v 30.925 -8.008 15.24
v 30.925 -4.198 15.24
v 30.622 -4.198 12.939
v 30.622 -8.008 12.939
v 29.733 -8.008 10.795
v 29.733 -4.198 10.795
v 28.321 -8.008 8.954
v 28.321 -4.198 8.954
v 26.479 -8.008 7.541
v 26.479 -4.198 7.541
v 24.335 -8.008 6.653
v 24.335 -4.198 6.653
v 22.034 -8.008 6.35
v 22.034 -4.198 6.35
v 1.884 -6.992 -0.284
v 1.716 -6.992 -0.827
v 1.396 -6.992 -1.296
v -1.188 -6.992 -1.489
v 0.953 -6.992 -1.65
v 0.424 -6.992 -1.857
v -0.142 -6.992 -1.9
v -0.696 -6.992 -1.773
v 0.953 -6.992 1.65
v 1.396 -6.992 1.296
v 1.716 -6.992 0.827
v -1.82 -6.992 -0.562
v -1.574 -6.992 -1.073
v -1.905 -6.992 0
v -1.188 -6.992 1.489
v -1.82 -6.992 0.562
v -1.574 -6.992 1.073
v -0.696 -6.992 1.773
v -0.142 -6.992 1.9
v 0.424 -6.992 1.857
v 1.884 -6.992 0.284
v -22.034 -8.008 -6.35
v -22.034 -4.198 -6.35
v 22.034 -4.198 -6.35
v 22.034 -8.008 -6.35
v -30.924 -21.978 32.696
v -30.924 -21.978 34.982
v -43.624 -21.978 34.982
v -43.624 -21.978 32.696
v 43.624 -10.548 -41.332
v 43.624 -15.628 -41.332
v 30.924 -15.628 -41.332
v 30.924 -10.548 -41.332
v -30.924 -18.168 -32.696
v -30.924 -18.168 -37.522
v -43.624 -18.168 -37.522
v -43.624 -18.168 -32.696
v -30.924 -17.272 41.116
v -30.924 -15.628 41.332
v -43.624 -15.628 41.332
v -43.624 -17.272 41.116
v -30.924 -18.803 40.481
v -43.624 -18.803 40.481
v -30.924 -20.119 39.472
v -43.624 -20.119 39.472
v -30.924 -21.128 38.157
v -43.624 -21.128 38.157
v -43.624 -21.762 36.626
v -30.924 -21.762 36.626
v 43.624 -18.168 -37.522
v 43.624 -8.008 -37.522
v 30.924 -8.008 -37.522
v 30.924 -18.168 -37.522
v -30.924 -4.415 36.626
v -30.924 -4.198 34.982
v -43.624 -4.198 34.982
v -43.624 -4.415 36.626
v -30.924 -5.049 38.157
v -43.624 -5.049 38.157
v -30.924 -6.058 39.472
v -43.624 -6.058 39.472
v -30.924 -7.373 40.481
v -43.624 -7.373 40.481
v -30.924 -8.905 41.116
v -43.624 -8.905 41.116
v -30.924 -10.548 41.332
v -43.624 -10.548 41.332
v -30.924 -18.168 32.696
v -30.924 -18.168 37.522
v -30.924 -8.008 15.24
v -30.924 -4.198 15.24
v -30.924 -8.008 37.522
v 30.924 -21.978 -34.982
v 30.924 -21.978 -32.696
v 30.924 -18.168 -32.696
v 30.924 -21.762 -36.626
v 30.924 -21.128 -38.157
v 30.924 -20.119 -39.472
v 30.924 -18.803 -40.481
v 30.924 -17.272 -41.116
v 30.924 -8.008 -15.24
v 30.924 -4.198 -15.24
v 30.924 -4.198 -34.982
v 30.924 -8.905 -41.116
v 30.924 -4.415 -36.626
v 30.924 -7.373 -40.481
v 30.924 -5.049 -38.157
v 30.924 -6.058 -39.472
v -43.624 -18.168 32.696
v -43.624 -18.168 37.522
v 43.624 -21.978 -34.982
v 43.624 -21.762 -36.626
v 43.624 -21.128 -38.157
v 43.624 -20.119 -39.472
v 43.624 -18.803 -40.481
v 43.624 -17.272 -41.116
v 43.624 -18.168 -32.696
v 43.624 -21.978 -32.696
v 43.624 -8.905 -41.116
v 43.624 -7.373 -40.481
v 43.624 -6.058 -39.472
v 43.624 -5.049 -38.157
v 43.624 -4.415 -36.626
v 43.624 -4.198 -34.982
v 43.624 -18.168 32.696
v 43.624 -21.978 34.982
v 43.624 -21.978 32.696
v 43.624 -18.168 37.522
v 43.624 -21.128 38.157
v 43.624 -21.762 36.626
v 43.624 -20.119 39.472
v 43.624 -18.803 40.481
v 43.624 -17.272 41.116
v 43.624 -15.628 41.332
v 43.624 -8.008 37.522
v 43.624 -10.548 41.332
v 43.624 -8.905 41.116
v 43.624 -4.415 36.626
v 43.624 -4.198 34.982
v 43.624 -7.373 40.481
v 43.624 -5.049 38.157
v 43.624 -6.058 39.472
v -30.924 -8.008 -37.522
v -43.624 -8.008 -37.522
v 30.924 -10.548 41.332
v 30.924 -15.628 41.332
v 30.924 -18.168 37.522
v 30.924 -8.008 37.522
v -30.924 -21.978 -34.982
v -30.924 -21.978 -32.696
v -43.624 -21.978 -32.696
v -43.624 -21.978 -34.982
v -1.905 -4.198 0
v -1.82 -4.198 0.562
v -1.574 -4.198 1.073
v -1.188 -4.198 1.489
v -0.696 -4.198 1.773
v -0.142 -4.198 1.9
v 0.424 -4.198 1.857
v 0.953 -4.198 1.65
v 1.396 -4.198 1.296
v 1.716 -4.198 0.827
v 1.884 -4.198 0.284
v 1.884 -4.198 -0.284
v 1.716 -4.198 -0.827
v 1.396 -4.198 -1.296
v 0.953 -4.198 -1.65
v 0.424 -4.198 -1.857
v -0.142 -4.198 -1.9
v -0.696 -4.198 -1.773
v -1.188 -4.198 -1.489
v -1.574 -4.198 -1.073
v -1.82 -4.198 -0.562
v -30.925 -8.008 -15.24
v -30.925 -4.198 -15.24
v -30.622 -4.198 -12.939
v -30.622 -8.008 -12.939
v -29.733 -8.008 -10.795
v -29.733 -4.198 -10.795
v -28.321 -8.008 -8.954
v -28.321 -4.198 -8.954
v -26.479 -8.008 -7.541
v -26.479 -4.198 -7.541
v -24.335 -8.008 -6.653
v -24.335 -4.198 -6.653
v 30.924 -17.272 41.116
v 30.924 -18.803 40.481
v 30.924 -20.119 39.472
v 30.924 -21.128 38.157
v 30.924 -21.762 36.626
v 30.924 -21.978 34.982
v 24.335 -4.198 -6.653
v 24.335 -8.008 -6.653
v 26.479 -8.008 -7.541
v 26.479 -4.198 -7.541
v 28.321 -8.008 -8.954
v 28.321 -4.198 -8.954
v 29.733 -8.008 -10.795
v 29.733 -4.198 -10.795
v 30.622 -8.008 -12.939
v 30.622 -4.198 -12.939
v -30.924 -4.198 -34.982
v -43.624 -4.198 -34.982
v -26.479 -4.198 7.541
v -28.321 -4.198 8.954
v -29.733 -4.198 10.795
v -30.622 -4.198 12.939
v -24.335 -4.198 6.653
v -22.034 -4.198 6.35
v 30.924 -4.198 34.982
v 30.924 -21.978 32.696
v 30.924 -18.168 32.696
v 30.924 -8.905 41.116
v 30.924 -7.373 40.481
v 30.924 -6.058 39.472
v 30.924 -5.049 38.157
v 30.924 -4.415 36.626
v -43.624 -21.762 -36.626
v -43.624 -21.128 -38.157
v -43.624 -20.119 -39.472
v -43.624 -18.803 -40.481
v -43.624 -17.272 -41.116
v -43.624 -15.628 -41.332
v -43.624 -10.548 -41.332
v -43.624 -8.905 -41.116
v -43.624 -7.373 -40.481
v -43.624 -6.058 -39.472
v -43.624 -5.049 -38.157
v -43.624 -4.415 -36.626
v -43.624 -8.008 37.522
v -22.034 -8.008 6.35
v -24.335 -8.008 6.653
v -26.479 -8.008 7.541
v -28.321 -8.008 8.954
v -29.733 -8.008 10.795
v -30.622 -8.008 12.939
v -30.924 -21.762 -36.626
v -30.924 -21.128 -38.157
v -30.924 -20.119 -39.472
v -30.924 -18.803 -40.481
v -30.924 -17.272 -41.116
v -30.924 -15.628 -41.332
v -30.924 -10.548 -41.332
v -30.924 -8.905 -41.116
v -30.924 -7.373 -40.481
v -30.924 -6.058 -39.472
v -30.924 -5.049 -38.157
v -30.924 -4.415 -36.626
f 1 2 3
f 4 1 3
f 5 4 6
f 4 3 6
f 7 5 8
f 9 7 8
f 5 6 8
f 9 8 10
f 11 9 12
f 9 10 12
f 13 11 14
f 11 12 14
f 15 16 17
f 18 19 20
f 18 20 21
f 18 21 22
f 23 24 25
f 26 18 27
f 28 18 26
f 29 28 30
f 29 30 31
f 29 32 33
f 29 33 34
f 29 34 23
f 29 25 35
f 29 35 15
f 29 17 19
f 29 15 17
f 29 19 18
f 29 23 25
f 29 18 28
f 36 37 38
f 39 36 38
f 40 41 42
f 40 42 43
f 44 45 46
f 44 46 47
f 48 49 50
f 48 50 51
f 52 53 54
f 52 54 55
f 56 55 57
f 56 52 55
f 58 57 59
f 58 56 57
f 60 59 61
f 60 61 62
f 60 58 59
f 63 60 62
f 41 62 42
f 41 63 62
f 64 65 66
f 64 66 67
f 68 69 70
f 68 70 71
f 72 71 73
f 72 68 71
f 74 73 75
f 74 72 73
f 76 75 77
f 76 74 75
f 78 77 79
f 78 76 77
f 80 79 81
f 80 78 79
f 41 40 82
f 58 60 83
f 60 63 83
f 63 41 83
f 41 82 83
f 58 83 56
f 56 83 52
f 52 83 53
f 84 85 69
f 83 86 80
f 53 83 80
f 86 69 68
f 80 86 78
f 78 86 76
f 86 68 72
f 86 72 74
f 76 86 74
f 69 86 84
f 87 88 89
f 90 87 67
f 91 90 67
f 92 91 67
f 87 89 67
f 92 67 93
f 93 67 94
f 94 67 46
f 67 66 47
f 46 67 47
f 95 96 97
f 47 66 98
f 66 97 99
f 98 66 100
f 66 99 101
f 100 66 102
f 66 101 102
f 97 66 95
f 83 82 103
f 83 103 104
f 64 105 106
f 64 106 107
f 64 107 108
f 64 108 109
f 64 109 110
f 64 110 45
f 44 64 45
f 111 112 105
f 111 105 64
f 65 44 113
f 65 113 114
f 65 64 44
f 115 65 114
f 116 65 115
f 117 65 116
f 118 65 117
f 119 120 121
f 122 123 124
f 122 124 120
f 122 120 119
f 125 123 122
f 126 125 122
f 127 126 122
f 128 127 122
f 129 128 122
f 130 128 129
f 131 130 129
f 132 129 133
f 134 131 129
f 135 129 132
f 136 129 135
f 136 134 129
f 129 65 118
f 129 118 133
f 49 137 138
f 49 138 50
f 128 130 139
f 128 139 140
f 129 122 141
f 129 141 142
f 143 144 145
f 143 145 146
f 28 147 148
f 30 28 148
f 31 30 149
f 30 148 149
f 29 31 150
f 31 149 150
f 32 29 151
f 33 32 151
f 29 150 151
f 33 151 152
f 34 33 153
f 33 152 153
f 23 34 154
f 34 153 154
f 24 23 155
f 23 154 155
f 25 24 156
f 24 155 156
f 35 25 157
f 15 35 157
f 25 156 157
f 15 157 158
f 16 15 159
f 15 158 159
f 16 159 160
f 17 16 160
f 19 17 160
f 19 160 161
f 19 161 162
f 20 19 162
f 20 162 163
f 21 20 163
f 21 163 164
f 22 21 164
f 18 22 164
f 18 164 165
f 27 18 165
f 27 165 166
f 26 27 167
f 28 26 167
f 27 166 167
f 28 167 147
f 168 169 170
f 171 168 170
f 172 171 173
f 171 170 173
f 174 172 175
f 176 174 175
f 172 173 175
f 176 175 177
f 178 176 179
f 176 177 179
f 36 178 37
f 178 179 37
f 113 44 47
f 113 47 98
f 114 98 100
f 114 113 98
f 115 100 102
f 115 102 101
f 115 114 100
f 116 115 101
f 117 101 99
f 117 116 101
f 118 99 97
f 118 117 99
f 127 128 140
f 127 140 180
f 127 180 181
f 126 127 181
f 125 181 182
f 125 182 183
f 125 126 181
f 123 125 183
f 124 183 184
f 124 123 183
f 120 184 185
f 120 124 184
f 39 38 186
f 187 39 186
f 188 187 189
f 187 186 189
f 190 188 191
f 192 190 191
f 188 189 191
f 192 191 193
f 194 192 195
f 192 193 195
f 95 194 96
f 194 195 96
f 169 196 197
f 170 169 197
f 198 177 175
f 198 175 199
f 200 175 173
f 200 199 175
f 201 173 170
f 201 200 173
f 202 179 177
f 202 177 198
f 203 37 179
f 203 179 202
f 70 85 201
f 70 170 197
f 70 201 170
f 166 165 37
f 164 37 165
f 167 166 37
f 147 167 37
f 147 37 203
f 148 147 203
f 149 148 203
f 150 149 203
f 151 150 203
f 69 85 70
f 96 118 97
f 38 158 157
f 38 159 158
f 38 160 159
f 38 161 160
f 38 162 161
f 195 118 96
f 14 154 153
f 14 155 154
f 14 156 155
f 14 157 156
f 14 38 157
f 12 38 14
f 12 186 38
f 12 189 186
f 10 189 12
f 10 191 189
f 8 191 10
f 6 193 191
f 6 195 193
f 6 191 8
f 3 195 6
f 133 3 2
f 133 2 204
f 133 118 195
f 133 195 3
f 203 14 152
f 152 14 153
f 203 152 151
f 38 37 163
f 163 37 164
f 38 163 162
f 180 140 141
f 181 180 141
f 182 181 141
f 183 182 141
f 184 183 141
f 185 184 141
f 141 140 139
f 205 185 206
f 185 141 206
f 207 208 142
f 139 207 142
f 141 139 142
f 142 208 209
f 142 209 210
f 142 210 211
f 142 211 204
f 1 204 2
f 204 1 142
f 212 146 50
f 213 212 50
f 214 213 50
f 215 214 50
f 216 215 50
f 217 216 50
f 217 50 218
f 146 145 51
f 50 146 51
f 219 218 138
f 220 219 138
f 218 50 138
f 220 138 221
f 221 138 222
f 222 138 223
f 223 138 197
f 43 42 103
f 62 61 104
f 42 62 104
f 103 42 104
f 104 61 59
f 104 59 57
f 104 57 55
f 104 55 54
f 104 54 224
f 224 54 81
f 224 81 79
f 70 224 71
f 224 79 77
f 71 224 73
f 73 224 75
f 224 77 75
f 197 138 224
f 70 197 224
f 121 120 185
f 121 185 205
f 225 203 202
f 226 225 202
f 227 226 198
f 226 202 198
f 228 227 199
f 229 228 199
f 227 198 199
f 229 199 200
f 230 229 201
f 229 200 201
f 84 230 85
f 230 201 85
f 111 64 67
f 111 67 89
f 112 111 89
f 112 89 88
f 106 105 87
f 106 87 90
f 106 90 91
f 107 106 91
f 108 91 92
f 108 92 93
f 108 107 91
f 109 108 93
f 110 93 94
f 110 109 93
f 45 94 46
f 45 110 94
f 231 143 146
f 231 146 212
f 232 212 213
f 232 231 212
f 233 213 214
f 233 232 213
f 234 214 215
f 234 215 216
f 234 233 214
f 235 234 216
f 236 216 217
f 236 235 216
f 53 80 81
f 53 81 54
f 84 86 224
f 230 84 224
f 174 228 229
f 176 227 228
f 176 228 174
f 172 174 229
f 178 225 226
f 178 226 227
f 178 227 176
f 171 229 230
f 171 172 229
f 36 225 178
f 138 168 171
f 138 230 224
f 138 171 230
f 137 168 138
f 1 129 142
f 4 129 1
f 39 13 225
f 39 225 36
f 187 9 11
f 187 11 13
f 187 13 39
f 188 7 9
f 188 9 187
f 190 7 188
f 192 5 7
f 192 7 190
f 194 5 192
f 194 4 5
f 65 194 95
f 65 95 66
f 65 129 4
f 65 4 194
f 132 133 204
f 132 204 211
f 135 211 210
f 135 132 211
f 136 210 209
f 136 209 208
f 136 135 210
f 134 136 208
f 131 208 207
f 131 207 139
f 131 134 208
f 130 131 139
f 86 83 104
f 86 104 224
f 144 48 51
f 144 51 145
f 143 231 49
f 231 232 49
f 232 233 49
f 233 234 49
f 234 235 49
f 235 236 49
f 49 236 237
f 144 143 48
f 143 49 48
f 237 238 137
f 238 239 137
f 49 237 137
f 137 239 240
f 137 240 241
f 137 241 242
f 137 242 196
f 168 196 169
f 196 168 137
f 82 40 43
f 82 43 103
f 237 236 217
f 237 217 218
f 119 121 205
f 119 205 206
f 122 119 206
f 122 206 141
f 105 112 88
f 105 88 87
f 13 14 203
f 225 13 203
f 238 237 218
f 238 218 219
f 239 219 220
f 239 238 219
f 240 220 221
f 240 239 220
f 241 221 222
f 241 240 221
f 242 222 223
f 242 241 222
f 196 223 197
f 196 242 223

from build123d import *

# Parameters (mm, degrees)
F1_DEPTH      = 43.6245
F1_DEPTH_BACK = 43.6245
F2_R          = 1.905
F3_DEPTH      = 2.794
F5_DEPTH      = 25.4


# Not quite as in the source:
# - a length typed as a fraction of an inch, garbled in the dataset ("3 / 203.2 mm" for 3/8 in), is restored


with BuildPart() as f1:
    # F0 (on Right) → F1 (new body, two sides)
    with BuildSketch(Plane.YZ) as f1_sk:
        with BuildLine():
            Line((-8.008403407, 37.52215), (-8.008403407, 0))
            Line((-8.008403407, 0), (-8.008403407, -37.52215))
            Line((-8.008403407, -37.52215), (-18.168403407, -37.52215))
            Line((-18.168403407, -37.52215), (-18.168403407, -32.69615))
            Line((-18.168403407, -32.69615), (-21.978403407, -32.69615))
            Line((-21.978403407, -32.69615), (-21.978403407, -34.98215))
            ThreePointArc((-21.978403407, -34.98215), (-20.1185314675, -39.4722780605), (-15.628403407, -41.33215))
            Line((-15.628403407, -41.33215), (-10.548403407, -41.33215))
            ThreePointArc((-10.548403407, -41.33215), (-6.0582753465, -39.4722780605), (-4.198403407, -34.98215))
            Line((-4.198403407, -34.98215), (-4.198403407, 0))
            Line((-4.198403407, 0), (-4.198403407, 34.98215))
            ThreePointArc((-4.198403407, 34.98215), (-6.0582753465, 39.4722780605), (-10.548403407, 41.33215))
            Line((-10.548403407, 41.33215), (-15.628403407, 41.33215))
            ThreePointArc((-15.628403407, 41.33215), (-20.1185314675, 39.4722780605), (-21.978403407, 34.98215))
            Line((-21.978403407, 34.98215), (-21.978403407, 32.69615))
            Line((-21.978403407, 32.69615), (-18.168403407, 32.69615))
            Line((-18.168403407, 32.69615), (-18.168403407, 37.52215))
            Line((-18.168403407, 37.52215), (-8.008403407, 37.52215))
        make_face()
    extrude(amount=F1_DEPTH)
    extrude(f1_sk.sketch, amount=-F1_DEPTH_BACK)

    # F2 (on face) → F3 (cut)
    with BuildSketch(Plane(origin=(0, -4.198403407, 0), x_dir=(-1, 0, 0), z_dir=(0, 1, 0))):
        Circle(F2_R)
    extrude(amount=-F3_DEPTH, mode=Mode.SUBTRACT)

    # F4 (on face) → F5 (cut)
    with BuildSketch(Plane(origin=(0, -4.198403407, 0), x_dir=(-1, 0, 0), z_dir=(0, 1, 0))):
        with BuildLine():
            Line((-22.0345, 6.35), (22.0345, 6.35))
            ThreePointArc((22.0345, 6.35), (28.3206792847, 8.9538207153), (30.9245, 15.24))
            Line((30.9245, 15.24), (30.9245, 50.7227726401))
            Line((30.9245, 50.7227726401), (-30.9245, 50.7227726401))
            Line((-30.9245, 50.7227726401), (-30.9245, 15.24))
            ThreePointArc((-30.9245, 15.24), (-28.3206792847, 8.9538207153), (-22.0345, 6.35))
        make_face()
        with BuildLine():
            ThreePointArc((30.9245, -15.24), (28.3206792847, -8.9538207153), (22.0345, -6.35))
            Line((22.0345, -6.35), (-22.0345, -6.35))
            ThreePointArc((-22.0345, -6.35), (-28.3206792847, -8.9538207153), (-30.9245, -15.24))
            Line((-30.9245, -15.24), (-30.9245, -50.7227726401))
            Line((-30.9245, -50.7227726401), (30.9245, -50.7227726401))
            Line((30.9245, -50.7227726401), (30.9245, -15.24))
        make_face()
    extrude(amount=-F5_DEPTH, mode=Mode.SUBTRACT)


solid = f1.part
